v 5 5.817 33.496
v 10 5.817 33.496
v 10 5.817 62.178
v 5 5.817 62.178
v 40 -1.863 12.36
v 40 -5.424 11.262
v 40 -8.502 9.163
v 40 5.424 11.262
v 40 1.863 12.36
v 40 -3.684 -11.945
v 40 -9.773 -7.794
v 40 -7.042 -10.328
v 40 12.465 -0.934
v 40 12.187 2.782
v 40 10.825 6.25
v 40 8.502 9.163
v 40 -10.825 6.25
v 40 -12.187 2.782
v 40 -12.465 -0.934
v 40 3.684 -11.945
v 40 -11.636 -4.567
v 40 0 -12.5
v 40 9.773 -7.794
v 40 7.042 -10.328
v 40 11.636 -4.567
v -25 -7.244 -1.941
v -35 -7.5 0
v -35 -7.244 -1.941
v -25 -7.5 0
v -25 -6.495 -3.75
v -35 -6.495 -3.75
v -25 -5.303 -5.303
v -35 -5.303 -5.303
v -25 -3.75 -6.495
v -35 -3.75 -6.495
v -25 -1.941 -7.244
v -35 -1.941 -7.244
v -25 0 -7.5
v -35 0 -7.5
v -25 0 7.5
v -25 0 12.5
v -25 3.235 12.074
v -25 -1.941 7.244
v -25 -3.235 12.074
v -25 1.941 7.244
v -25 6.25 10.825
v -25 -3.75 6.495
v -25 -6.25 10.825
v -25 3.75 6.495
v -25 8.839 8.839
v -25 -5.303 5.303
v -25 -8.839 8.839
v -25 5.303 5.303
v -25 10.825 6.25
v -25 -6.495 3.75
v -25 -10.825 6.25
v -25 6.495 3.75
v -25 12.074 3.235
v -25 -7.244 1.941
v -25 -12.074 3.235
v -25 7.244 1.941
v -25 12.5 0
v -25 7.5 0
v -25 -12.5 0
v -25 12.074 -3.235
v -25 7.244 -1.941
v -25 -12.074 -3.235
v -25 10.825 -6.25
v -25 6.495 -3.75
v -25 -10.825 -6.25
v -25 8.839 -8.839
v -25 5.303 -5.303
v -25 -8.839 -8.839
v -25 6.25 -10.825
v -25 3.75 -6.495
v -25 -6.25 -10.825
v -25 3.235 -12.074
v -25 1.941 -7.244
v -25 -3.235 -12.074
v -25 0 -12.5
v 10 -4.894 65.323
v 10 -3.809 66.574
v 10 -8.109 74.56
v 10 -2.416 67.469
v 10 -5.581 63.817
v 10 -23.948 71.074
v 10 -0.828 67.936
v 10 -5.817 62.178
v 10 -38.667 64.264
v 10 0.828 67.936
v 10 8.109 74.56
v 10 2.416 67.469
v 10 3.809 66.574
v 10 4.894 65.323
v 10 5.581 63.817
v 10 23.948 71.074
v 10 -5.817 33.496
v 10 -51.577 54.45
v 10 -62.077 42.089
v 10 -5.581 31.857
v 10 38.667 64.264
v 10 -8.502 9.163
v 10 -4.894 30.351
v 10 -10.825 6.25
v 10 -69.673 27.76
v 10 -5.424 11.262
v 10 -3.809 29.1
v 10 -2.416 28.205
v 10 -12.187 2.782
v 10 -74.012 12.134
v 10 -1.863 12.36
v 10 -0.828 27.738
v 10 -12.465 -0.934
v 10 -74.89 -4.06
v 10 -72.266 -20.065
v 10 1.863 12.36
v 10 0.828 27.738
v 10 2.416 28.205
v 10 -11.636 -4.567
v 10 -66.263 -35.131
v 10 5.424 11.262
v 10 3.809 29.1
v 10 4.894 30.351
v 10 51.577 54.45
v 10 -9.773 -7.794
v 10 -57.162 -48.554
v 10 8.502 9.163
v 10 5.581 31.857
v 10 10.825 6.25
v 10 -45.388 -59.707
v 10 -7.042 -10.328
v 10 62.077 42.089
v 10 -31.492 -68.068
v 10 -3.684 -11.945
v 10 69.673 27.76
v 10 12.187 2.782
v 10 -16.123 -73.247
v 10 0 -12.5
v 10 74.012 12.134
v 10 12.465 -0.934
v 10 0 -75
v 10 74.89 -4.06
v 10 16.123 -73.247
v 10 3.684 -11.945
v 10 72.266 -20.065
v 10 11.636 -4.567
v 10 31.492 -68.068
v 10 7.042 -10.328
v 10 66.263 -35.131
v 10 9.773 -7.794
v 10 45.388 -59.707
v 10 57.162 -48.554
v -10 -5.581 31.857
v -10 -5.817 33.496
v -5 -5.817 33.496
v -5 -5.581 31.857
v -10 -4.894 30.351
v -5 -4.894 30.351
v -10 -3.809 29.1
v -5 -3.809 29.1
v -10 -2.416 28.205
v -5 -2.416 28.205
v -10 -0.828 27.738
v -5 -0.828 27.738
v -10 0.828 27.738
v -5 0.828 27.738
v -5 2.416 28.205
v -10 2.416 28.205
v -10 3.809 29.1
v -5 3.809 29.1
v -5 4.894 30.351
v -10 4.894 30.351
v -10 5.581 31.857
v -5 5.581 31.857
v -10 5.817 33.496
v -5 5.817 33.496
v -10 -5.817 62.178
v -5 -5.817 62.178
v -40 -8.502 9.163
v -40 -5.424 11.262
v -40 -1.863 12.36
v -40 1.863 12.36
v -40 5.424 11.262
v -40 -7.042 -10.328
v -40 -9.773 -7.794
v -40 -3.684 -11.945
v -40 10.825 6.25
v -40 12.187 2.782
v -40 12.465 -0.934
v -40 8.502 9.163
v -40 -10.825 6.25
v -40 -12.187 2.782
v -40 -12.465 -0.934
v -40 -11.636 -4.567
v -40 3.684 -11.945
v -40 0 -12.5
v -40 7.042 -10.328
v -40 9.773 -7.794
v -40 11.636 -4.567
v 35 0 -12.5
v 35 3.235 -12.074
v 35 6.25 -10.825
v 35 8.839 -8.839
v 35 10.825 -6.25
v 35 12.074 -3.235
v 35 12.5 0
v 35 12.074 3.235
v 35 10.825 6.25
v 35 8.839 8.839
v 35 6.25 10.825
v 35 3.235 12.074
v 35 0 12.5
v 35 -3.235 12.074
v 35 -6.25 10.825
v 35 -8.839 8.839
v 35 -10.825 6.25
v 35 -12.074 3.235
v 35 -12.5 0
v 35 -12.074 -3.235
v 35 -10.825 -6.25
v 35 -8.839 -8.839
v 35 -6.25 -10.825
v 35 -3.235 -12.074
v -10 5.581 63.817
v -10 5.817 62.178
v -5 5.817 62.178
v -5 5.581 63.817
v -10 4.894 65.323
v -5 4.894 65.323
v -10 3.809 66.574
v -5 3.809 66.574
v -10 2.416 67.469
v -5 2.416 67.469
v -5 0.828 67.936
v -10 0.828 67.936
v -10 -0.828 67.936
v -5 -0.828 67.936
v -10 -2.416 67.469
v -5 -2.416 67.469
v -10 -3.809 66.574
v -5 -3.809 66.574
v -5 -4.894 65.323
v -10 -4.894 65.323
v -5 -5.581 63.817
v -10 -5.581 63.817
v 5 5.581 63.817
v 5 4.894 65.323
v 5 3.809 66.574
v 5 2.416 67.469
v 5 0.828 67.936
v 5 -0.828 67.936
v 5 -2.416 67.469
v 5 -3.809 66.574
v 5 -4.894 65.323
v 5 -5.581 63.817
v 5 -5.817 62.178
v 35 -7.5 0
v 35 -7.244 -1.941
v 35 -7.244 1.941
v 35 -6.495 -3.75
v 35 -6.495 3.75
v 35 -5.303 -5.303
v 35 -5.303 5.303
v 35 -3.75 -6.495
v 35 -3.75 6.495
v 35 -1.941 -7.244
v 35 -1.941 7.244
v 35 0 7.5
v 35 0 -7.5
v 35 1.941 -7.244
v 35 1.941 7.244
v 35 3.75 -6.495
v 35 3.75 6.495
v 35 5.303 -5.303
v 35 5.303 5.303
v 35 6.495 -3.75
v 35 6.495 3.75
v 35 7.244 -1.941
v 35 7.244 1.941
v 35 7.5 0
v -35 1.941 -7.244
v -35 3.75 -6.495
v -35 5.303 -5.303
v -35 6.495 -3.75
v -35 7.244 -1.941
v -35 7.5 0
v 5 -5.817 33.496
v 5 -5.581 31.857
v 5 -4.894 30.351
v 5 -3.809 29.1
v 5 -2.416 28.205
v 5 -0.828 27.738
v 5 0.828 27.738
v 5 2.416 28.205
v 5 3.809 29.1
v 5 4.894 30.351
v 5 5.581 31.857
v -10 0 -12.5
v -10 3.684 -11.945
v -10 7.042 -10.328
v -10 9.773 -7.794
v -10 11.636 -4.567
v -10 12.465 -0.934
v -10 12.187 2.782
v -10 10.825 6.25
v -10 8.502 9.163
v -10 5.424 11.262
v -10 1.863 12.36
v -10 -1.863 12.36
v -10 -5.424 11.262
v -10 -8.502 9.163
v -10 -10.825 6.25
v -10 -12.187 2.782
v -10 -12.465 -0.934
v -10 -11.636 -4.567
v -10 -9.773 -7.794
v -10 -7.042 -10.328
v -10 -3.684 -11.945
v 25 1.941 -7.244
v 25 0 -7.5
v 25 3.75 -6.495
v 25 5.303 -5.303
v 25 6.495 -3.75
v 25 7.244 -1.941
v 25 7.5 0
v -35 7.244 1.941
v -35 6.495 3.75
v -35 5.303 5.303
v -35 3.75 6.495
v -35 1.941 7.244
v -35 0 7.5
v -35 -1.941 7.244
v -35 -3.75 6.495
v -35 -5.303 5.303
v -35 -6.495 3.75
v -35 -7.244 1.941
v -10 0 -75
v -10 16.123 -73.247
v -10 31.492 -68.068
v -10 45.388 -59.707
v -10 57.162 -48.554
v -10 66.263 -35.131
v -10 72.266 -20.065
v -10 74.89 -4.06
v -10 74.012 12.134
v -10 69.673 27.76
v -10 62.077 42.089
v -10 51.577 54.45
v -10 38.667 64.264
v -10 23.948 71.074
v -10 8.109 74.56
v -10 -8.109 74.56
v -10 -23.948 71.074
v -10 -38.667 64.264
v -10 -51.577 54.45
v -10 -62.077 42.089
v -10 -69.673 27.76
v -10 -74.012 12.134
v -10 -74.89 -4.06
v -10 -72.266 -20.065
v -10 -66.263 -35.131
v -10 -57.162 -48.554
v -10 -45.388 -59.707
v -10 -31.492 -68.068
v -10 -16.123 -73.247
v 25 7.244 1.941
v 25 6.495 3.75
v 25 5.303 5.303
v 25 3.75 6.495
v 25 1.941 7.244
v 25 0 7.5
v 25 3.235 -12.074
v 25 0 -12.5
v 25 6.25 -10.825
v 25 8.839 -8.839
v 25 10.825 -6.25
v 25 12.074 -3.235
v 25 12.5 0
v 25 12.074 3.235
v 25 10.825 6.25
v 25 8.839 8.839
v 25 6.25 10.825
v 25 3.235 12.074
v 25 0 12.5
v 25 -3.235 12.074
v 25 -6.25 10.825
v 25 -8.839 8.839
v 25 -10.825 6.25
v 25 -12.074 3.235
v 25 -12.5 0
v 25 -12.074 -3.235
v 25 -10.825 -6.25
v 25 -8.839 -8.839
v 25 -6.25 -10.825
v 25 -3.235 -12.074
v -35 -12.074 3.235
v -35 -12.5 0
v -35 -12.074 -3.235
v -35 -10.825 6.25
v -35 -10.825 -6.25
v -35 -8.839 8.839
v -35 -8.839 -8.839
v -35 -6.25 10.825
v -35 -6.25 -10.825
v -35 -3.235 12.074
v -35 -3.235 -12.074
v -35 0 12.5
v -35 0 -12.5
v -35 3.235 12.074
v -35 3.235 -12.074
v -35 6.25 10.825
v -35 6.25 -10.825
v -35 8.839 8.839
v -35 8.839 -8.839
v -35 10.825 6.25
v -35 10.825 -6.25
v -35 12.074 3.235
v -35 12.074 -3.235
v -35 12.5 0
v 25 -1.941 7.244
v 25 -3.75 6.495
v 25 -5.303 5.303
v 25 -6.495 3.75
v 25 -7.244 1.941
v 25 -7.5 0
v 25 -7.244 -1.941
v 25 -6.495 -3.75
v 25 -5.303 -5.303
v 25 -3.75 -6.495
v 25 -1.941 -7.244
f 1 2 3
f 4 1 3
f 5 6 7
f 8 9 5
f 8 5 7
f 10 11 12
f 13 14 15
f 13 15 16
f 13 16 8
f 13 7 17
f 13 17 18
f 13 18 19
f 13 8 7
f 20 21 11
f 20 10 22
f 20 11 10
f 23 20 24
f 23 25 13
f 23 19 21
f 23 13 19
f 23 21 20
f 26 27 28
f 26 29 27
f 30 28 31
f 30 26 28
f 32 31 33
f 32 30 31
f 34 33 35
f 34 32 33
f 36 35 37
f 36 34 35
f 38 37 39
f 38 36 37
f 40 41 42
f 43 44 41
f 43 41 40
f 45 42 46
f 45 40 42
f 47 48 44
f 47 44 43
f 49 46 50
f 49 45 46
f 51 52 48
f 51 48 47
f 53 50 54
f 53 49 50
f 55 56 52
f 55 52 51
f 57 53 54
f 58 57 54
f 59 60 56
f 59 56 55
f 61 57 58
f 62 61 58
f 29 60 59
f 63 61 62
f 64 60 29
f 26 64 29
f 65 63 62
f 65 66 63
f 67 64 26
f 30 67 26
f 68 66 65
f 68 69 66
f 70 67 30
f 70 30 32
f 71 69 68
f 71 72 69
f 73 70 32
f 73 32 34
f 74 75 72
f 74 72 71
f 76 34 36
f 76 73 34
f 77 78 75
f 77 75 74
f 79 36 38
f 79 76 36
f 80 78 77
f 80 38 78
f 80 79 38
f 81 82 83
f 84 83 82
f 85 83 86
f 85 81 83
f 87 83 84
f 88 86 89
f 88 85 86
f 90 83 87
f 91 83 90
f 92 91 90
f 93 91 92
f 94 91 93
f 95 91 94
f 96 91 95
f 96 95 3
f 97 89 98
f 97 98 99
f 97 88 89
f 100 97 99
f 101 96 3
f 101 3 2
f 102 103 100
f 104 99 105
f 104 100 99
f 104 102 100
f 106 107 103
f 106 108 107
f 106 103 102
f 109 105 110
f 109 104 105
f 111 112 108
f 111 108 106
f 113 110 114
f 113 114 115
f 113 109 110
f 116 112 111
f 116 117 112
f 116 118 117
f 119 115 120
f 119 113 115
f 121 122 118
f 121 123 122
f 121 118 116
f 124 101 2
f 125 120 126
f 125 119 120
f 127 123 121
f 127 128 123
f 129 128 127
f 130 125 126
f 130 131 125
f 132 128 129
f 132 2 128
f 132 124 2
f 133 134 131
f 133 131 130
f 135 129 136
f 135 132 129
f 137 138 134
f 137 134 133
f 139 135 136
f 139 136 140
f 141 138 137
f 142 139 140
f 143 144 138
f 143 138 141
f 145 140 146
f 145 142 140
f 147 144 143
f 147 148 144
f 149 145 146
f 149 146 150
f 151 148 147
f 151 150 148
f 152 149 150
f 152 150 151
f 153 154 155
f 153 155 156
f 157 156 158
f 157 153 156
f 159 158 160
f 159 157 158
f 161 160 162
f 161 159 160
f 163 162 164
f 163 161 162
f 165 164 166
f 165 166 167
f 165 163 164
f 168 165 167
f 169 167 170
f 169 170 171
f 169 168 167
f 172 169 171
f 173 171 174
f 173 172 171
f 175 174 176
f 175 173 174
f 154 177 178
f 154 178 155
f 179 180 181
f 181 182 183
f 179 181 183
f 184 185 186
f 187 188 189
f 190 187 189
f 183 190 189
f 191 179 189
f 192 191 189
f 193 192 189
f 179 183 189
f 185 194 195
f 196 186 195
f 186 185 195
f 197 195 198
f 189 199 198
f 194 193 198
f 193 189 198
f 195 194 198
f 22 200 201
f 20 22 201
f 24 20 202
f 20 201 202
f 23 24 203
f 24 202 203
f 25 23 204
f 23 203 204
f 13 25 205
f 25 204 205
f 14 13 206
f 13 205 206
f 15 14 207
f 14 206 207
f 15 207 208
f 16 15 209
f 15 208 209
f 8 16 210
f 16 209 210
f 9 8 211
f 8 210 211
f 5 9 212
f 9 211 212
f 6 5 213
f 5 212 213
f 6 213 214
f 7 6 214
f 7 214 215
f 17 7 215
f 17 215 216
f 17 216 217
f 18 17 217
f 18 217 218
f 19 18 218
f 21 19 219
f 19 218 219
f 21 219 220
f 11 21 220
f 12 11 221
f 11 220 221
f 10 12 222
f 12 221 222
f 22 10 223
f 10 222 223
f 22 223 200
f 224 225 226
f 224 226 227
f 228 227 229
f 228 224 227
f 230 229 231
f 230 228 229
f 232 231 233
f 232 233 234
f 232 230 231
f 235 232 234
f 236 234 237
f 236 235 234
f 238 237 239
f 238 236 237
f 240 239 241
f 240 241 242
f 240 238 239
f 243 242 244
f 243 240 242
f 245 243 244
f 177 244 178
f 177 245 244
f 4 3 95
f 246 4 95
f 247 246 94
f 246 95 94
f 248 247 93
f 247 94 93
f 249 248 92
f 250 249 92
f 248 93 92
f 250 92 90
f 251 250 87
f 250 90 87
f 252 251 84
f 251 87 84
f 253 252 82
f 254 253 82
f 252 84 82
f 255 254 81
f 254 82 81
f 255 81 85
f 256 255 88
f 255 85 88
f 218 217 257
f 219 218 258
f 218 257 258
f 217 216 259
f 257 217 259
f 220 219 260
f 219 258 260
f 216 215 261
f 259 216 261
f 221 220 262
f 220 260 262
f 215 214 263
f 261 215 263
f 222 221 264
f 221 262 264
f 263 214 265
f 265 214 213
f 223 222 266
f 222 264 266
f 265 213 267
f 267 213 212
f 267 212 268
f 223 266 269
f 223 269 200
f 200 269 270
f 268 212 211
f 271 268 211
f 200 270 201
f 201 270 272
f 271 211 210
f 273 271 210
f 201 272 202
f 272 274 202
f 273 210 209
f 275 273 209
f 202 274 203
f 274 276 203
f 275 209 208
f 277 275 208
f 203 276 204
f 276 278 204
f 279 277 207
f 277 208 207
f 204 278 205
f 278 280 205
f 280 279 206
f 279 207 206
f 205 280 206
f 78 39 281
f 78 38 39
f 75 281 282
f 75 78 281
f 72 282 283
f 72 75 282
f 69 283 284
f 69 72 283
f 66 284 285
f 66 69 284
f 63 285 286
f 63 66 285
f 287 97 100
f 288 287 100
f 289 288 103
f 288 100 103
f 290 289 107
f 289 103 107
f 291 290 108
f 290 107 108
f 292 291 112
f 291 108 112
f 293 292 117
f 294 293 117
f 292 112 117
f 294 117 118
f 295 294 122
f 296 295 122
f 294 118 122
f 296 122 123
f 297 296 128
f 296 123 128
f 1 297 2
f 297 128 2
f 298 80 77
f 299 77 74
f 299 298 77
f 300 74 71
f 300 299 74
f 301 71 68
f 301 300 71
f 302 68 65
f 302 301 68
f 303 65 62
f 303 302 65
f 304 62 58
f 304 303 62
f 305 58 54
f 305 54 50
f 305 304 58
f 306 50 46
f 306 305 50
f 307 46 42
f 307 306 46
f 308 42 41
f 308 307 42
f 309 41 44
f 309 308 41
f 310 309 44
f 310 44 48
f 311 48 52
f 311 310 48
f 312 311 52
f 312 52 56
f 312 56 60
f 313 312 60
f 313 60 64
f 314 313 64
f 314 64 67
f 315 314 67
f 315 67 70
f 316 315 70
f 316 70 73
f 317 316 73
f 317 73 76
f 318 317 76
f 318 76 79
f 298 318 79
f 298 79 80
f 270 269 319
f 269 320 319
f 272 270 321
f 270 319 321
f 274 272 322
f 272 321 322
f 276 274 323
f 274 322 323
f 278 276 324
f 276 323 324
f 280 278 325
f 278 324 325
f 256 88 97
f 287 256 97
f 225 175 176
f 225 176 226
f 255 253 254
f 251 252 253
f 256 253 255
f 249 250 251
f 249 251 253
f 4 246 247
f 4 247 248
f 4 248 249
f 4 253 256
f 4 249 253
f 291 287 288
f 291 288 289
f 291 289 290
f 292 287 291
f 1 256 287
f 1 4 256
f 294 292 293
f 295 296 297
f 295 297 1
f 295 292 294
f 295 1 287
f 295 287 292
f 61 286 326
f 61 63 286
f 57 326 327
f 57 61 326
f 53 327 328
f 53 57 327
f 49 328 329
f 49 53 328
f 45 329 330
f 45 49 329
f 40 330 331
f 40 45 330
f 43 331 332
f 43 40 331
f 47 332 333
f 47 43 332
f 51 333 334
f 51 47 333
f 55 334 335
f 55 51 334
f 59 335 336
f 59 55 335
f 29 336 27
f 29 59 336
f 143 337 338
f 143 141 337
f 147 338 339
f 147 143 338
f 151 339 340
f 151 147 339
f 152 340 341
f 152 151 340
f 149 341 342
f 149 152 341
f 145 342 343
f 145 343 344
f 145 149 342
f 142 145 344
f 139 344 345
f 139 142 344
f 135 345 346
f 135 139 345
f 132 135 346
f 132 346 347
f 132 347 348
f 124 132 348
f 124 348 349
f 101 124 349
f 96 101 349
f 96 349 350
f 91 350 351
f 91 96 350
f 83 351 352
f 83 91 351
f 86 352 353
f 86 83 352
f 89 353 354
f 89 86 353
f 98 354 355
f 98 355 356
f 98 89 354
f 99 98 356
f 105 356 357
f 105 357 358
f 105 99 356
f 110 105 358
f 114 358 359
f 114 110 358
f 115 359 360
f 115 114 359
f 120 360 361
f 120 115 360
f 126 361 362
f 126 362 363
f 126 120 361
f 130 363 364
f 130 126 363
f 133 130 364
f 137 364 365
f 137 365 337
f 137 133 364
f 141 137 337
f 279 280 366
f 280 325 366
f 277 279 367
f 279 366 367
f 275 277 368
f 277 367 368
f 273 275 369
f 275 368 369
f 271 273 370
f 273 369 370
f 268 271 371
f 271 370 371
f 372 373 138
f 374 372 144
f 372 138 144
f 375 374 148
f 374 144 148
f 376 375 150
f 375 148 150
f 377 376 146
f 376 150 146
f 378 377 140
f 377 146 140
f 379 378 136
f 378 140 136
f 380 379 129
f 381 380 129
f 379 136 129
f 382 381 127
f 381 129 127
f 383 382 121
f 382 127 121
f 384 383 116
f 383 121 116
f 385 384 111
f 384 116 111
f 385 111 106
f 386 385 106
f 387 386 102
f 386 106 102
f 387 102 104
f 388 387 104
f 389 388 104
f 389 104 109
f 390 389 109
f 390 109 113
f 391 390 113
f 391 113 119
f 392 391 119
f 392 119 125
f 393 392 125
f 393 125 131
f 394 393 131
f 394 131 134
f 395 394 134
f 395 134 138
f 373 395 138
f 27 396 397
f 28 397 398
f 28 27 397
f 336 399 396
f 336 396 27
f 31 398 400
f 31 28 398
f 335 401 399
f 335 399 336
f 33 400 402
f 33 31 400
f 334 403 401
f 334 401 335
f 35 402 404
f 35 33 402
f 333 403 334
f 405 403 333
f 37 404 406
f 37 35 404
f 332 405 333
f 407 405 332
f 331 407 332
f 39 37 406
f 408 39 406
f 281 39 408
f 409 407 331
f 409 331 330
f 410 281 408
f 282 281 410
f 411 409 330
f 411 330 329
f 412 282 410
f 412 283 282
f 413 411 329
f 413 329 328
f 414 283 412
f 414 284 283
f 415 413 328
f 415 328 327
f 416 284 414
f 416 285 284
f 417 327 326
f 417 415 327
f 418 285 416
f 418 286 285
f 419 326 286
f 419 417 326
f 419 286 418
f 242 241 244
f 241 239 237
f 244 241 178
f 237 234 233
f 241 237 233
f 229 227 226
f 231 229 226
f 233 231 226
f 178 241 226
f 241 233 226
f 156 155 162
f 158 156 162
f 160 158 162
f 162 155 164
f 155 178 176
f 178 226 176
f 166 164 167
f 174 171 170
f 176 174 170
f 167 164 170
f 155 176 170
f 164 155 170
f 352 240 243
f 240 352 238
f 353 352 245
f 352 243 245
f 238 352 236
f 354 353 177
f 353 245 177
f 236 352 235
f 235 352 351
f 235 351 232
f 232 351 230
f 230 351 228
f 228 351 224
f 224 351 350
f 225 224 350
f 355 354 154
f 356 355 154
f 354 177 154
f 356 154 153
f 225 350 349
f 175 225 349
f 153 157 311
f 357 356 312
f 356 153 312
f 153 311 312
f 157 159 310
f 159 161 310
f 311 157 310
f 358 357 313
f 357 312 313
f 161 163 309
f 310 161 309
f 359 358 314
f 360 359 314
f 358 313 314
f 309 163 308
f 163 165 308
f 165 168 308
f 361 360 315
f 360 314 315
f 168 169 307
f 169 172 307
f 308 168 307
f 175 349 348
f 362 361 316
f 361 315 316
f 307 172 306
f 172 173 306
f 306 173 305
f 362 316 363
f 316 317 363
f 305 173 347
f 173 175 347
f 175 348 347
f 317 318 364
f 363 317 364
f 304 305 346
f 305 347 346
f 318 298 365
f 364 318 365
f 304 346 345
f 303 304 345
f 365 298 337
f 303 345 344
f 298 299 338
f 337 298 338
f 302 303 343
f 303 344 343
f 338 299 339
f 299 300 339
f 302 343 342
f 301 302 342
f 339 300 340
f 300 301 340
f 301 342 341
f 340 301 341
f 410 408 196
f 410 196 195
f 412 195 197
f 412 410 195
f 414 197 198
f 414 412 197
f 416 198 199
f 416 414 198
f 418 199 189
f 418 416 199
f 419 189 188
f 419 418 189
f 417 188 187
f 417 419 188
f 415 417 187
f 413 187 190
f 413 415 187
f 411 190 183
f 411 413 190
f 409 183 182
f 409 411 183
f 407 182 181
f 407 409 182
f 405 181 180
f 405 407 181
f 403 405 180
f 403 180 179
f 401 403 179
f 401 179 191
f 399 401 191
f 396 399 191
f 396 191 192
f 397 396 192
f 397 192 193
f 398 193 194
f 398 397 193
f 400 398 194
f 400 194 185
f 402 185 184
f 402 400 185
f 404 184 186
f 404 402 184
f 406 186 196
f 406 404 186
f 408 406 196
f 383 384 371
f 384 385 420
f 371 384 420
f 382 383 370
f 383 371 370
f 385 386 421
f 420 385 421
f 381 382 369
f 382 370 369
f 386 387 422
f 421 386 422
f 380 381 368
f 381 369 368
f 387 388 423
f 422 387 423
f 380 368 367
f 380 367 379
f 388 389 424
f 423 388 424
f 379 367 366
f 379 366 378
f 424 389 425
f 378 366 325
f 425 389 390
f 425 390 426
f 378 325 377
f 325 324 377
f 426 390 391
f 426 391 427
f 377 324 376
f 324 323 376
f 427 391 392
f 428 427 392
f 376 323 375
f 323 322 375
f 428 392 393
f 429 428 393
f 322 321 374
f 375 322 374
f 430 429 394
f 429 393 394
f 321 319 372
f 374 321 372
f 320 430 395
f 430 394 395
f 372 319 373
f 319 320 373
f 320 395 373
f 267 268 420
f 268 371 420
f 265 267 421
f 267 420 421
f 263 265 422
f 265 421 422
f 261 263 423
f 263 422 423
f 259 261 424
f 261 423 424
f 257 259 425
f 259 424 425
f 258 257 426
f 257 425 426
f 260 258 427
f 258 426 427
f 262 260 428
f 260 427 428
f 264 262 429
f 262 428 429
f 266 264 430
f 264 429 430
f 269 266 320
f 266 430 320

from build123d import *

# Parameters (mm, degrees)
SKETCH_1_R          = 75
EXTRUDE_1_DEPTH     = 10
SKETCH_2_R          = 12.5
EXTRUDE_2_DEPTH     = 30
SKETCH_3_W          = 10
SKETCH_3_H          = 5
CUT_EXTRUDE_1_DEPTH = 5


with BuildPart() as part:
    # 草图1 → 凸台-拉伸1 (new body)
    with BuildSketch(Plane(origin=(0, 0, 0), x_dir=(0, 0, -1), z_dir=(1, 0, 0))):
        Circle(SKETCH_1_R)
    extrude_1 = extrude(amount=EXTRUDE_1_DEPTH)

    # 草图2 → 凸台-拉伸2 (add)
    with BuildSketch(Plane(origin=(10, 0, 0), x_dir=(0, 0, -1), z_dir=(1, 0, 0))):
        Circle(SKETCH_2_R)
    extrude_2 = extrude(amount=EXTRUDE_2_DEPTH)

    # 镜向1: 凸台-拉伸1, 凸台-拉伸2 across plane
    add(extrude_1.mirror(Plane(origin=(0, 0, 0), x_dir=(0, 0, 1), z_dir=(1, 0, 0))))
    add(extrude_2.mirror(Plane(origin=(0, 0, 0), x_dir=(0, 0, 1), z_dir=(1, 0, 0))))

    # 切除-扫描1: sweep along a curve in space
    with BuildLine() as sweep_1_path:
        ThreePointArc((-40, 0, -12.5), (-40, 8.838834765, -8.838834765), (-40, 12.5, 0))
        ThreePointArc((-40, 12.5, 0), (-40, 8.838834765, 8.838834765), (-40, 0, 12.5))
        ThreePointArc((-40, 0, 12.5), (-40, -8.838834765, 8.838834765), (-40, -12.5, 0))
        ThreePointArc((-40, -12.5, 0), (-40, -8.838834765, -8.838834765), (-40, 0, -12.5))
    # 草图3 → 切除-扫描1 (sweep, cut)
    with BuildSketch(Plane(origin=(0, 0, 0), x_dir=(1, 0, 0), z_dir=(0, 1, 0))):
        with Locations((-30, 10)):
            Rectangle(SKETCH_3_W, SKETCH_3_H)
    sweep_1 = sweep(path=sweep_1_path.line, mode=Mode.SUBTRACT)

    # 镜向2: 切除-扫描1 across plane
    add(sweep_1.mirror(Plane(origin=(0, 0, 0), x_dir=(0, 0, 1), z_dir=(1, 0, 0))), mode=Mode.SUBTRACT)

    # 草图5 → 切除-拉伸1 (cut)
    with BuildSketch(Plane.ZY.offset(10)):
        with BuildLine():
            Line((62.177784285, -5.817003296), (33.496104549, -5.817003296))
            ThreePointArc((33.496104549, -5.817003296), (27.679101253, 0), (33.496104549, 5.817003296))
            Line((33.496104549, 5.817003296), (62.177784285, 5.817003296))
            ThreePointArc((62.177784285, 5.817003296), (67.994787582, 0), (62.177784285, -5.817003296))
        make_face()
    cut_extrude_1 = extrude(amount=-CUT_EXTRUDE_1_DEPTH, mode=Mode.SUBTRACT)

    # 镜向3: 切除-拉伸1 across plane
    add(cut_extrude_1.mirror(Plane(origin=(0, 0, 0), x_dir=(0, 0, 1), z_dir=(1, 0, 0))), mode=Mode.SUBTRACT)


solid = part.part
